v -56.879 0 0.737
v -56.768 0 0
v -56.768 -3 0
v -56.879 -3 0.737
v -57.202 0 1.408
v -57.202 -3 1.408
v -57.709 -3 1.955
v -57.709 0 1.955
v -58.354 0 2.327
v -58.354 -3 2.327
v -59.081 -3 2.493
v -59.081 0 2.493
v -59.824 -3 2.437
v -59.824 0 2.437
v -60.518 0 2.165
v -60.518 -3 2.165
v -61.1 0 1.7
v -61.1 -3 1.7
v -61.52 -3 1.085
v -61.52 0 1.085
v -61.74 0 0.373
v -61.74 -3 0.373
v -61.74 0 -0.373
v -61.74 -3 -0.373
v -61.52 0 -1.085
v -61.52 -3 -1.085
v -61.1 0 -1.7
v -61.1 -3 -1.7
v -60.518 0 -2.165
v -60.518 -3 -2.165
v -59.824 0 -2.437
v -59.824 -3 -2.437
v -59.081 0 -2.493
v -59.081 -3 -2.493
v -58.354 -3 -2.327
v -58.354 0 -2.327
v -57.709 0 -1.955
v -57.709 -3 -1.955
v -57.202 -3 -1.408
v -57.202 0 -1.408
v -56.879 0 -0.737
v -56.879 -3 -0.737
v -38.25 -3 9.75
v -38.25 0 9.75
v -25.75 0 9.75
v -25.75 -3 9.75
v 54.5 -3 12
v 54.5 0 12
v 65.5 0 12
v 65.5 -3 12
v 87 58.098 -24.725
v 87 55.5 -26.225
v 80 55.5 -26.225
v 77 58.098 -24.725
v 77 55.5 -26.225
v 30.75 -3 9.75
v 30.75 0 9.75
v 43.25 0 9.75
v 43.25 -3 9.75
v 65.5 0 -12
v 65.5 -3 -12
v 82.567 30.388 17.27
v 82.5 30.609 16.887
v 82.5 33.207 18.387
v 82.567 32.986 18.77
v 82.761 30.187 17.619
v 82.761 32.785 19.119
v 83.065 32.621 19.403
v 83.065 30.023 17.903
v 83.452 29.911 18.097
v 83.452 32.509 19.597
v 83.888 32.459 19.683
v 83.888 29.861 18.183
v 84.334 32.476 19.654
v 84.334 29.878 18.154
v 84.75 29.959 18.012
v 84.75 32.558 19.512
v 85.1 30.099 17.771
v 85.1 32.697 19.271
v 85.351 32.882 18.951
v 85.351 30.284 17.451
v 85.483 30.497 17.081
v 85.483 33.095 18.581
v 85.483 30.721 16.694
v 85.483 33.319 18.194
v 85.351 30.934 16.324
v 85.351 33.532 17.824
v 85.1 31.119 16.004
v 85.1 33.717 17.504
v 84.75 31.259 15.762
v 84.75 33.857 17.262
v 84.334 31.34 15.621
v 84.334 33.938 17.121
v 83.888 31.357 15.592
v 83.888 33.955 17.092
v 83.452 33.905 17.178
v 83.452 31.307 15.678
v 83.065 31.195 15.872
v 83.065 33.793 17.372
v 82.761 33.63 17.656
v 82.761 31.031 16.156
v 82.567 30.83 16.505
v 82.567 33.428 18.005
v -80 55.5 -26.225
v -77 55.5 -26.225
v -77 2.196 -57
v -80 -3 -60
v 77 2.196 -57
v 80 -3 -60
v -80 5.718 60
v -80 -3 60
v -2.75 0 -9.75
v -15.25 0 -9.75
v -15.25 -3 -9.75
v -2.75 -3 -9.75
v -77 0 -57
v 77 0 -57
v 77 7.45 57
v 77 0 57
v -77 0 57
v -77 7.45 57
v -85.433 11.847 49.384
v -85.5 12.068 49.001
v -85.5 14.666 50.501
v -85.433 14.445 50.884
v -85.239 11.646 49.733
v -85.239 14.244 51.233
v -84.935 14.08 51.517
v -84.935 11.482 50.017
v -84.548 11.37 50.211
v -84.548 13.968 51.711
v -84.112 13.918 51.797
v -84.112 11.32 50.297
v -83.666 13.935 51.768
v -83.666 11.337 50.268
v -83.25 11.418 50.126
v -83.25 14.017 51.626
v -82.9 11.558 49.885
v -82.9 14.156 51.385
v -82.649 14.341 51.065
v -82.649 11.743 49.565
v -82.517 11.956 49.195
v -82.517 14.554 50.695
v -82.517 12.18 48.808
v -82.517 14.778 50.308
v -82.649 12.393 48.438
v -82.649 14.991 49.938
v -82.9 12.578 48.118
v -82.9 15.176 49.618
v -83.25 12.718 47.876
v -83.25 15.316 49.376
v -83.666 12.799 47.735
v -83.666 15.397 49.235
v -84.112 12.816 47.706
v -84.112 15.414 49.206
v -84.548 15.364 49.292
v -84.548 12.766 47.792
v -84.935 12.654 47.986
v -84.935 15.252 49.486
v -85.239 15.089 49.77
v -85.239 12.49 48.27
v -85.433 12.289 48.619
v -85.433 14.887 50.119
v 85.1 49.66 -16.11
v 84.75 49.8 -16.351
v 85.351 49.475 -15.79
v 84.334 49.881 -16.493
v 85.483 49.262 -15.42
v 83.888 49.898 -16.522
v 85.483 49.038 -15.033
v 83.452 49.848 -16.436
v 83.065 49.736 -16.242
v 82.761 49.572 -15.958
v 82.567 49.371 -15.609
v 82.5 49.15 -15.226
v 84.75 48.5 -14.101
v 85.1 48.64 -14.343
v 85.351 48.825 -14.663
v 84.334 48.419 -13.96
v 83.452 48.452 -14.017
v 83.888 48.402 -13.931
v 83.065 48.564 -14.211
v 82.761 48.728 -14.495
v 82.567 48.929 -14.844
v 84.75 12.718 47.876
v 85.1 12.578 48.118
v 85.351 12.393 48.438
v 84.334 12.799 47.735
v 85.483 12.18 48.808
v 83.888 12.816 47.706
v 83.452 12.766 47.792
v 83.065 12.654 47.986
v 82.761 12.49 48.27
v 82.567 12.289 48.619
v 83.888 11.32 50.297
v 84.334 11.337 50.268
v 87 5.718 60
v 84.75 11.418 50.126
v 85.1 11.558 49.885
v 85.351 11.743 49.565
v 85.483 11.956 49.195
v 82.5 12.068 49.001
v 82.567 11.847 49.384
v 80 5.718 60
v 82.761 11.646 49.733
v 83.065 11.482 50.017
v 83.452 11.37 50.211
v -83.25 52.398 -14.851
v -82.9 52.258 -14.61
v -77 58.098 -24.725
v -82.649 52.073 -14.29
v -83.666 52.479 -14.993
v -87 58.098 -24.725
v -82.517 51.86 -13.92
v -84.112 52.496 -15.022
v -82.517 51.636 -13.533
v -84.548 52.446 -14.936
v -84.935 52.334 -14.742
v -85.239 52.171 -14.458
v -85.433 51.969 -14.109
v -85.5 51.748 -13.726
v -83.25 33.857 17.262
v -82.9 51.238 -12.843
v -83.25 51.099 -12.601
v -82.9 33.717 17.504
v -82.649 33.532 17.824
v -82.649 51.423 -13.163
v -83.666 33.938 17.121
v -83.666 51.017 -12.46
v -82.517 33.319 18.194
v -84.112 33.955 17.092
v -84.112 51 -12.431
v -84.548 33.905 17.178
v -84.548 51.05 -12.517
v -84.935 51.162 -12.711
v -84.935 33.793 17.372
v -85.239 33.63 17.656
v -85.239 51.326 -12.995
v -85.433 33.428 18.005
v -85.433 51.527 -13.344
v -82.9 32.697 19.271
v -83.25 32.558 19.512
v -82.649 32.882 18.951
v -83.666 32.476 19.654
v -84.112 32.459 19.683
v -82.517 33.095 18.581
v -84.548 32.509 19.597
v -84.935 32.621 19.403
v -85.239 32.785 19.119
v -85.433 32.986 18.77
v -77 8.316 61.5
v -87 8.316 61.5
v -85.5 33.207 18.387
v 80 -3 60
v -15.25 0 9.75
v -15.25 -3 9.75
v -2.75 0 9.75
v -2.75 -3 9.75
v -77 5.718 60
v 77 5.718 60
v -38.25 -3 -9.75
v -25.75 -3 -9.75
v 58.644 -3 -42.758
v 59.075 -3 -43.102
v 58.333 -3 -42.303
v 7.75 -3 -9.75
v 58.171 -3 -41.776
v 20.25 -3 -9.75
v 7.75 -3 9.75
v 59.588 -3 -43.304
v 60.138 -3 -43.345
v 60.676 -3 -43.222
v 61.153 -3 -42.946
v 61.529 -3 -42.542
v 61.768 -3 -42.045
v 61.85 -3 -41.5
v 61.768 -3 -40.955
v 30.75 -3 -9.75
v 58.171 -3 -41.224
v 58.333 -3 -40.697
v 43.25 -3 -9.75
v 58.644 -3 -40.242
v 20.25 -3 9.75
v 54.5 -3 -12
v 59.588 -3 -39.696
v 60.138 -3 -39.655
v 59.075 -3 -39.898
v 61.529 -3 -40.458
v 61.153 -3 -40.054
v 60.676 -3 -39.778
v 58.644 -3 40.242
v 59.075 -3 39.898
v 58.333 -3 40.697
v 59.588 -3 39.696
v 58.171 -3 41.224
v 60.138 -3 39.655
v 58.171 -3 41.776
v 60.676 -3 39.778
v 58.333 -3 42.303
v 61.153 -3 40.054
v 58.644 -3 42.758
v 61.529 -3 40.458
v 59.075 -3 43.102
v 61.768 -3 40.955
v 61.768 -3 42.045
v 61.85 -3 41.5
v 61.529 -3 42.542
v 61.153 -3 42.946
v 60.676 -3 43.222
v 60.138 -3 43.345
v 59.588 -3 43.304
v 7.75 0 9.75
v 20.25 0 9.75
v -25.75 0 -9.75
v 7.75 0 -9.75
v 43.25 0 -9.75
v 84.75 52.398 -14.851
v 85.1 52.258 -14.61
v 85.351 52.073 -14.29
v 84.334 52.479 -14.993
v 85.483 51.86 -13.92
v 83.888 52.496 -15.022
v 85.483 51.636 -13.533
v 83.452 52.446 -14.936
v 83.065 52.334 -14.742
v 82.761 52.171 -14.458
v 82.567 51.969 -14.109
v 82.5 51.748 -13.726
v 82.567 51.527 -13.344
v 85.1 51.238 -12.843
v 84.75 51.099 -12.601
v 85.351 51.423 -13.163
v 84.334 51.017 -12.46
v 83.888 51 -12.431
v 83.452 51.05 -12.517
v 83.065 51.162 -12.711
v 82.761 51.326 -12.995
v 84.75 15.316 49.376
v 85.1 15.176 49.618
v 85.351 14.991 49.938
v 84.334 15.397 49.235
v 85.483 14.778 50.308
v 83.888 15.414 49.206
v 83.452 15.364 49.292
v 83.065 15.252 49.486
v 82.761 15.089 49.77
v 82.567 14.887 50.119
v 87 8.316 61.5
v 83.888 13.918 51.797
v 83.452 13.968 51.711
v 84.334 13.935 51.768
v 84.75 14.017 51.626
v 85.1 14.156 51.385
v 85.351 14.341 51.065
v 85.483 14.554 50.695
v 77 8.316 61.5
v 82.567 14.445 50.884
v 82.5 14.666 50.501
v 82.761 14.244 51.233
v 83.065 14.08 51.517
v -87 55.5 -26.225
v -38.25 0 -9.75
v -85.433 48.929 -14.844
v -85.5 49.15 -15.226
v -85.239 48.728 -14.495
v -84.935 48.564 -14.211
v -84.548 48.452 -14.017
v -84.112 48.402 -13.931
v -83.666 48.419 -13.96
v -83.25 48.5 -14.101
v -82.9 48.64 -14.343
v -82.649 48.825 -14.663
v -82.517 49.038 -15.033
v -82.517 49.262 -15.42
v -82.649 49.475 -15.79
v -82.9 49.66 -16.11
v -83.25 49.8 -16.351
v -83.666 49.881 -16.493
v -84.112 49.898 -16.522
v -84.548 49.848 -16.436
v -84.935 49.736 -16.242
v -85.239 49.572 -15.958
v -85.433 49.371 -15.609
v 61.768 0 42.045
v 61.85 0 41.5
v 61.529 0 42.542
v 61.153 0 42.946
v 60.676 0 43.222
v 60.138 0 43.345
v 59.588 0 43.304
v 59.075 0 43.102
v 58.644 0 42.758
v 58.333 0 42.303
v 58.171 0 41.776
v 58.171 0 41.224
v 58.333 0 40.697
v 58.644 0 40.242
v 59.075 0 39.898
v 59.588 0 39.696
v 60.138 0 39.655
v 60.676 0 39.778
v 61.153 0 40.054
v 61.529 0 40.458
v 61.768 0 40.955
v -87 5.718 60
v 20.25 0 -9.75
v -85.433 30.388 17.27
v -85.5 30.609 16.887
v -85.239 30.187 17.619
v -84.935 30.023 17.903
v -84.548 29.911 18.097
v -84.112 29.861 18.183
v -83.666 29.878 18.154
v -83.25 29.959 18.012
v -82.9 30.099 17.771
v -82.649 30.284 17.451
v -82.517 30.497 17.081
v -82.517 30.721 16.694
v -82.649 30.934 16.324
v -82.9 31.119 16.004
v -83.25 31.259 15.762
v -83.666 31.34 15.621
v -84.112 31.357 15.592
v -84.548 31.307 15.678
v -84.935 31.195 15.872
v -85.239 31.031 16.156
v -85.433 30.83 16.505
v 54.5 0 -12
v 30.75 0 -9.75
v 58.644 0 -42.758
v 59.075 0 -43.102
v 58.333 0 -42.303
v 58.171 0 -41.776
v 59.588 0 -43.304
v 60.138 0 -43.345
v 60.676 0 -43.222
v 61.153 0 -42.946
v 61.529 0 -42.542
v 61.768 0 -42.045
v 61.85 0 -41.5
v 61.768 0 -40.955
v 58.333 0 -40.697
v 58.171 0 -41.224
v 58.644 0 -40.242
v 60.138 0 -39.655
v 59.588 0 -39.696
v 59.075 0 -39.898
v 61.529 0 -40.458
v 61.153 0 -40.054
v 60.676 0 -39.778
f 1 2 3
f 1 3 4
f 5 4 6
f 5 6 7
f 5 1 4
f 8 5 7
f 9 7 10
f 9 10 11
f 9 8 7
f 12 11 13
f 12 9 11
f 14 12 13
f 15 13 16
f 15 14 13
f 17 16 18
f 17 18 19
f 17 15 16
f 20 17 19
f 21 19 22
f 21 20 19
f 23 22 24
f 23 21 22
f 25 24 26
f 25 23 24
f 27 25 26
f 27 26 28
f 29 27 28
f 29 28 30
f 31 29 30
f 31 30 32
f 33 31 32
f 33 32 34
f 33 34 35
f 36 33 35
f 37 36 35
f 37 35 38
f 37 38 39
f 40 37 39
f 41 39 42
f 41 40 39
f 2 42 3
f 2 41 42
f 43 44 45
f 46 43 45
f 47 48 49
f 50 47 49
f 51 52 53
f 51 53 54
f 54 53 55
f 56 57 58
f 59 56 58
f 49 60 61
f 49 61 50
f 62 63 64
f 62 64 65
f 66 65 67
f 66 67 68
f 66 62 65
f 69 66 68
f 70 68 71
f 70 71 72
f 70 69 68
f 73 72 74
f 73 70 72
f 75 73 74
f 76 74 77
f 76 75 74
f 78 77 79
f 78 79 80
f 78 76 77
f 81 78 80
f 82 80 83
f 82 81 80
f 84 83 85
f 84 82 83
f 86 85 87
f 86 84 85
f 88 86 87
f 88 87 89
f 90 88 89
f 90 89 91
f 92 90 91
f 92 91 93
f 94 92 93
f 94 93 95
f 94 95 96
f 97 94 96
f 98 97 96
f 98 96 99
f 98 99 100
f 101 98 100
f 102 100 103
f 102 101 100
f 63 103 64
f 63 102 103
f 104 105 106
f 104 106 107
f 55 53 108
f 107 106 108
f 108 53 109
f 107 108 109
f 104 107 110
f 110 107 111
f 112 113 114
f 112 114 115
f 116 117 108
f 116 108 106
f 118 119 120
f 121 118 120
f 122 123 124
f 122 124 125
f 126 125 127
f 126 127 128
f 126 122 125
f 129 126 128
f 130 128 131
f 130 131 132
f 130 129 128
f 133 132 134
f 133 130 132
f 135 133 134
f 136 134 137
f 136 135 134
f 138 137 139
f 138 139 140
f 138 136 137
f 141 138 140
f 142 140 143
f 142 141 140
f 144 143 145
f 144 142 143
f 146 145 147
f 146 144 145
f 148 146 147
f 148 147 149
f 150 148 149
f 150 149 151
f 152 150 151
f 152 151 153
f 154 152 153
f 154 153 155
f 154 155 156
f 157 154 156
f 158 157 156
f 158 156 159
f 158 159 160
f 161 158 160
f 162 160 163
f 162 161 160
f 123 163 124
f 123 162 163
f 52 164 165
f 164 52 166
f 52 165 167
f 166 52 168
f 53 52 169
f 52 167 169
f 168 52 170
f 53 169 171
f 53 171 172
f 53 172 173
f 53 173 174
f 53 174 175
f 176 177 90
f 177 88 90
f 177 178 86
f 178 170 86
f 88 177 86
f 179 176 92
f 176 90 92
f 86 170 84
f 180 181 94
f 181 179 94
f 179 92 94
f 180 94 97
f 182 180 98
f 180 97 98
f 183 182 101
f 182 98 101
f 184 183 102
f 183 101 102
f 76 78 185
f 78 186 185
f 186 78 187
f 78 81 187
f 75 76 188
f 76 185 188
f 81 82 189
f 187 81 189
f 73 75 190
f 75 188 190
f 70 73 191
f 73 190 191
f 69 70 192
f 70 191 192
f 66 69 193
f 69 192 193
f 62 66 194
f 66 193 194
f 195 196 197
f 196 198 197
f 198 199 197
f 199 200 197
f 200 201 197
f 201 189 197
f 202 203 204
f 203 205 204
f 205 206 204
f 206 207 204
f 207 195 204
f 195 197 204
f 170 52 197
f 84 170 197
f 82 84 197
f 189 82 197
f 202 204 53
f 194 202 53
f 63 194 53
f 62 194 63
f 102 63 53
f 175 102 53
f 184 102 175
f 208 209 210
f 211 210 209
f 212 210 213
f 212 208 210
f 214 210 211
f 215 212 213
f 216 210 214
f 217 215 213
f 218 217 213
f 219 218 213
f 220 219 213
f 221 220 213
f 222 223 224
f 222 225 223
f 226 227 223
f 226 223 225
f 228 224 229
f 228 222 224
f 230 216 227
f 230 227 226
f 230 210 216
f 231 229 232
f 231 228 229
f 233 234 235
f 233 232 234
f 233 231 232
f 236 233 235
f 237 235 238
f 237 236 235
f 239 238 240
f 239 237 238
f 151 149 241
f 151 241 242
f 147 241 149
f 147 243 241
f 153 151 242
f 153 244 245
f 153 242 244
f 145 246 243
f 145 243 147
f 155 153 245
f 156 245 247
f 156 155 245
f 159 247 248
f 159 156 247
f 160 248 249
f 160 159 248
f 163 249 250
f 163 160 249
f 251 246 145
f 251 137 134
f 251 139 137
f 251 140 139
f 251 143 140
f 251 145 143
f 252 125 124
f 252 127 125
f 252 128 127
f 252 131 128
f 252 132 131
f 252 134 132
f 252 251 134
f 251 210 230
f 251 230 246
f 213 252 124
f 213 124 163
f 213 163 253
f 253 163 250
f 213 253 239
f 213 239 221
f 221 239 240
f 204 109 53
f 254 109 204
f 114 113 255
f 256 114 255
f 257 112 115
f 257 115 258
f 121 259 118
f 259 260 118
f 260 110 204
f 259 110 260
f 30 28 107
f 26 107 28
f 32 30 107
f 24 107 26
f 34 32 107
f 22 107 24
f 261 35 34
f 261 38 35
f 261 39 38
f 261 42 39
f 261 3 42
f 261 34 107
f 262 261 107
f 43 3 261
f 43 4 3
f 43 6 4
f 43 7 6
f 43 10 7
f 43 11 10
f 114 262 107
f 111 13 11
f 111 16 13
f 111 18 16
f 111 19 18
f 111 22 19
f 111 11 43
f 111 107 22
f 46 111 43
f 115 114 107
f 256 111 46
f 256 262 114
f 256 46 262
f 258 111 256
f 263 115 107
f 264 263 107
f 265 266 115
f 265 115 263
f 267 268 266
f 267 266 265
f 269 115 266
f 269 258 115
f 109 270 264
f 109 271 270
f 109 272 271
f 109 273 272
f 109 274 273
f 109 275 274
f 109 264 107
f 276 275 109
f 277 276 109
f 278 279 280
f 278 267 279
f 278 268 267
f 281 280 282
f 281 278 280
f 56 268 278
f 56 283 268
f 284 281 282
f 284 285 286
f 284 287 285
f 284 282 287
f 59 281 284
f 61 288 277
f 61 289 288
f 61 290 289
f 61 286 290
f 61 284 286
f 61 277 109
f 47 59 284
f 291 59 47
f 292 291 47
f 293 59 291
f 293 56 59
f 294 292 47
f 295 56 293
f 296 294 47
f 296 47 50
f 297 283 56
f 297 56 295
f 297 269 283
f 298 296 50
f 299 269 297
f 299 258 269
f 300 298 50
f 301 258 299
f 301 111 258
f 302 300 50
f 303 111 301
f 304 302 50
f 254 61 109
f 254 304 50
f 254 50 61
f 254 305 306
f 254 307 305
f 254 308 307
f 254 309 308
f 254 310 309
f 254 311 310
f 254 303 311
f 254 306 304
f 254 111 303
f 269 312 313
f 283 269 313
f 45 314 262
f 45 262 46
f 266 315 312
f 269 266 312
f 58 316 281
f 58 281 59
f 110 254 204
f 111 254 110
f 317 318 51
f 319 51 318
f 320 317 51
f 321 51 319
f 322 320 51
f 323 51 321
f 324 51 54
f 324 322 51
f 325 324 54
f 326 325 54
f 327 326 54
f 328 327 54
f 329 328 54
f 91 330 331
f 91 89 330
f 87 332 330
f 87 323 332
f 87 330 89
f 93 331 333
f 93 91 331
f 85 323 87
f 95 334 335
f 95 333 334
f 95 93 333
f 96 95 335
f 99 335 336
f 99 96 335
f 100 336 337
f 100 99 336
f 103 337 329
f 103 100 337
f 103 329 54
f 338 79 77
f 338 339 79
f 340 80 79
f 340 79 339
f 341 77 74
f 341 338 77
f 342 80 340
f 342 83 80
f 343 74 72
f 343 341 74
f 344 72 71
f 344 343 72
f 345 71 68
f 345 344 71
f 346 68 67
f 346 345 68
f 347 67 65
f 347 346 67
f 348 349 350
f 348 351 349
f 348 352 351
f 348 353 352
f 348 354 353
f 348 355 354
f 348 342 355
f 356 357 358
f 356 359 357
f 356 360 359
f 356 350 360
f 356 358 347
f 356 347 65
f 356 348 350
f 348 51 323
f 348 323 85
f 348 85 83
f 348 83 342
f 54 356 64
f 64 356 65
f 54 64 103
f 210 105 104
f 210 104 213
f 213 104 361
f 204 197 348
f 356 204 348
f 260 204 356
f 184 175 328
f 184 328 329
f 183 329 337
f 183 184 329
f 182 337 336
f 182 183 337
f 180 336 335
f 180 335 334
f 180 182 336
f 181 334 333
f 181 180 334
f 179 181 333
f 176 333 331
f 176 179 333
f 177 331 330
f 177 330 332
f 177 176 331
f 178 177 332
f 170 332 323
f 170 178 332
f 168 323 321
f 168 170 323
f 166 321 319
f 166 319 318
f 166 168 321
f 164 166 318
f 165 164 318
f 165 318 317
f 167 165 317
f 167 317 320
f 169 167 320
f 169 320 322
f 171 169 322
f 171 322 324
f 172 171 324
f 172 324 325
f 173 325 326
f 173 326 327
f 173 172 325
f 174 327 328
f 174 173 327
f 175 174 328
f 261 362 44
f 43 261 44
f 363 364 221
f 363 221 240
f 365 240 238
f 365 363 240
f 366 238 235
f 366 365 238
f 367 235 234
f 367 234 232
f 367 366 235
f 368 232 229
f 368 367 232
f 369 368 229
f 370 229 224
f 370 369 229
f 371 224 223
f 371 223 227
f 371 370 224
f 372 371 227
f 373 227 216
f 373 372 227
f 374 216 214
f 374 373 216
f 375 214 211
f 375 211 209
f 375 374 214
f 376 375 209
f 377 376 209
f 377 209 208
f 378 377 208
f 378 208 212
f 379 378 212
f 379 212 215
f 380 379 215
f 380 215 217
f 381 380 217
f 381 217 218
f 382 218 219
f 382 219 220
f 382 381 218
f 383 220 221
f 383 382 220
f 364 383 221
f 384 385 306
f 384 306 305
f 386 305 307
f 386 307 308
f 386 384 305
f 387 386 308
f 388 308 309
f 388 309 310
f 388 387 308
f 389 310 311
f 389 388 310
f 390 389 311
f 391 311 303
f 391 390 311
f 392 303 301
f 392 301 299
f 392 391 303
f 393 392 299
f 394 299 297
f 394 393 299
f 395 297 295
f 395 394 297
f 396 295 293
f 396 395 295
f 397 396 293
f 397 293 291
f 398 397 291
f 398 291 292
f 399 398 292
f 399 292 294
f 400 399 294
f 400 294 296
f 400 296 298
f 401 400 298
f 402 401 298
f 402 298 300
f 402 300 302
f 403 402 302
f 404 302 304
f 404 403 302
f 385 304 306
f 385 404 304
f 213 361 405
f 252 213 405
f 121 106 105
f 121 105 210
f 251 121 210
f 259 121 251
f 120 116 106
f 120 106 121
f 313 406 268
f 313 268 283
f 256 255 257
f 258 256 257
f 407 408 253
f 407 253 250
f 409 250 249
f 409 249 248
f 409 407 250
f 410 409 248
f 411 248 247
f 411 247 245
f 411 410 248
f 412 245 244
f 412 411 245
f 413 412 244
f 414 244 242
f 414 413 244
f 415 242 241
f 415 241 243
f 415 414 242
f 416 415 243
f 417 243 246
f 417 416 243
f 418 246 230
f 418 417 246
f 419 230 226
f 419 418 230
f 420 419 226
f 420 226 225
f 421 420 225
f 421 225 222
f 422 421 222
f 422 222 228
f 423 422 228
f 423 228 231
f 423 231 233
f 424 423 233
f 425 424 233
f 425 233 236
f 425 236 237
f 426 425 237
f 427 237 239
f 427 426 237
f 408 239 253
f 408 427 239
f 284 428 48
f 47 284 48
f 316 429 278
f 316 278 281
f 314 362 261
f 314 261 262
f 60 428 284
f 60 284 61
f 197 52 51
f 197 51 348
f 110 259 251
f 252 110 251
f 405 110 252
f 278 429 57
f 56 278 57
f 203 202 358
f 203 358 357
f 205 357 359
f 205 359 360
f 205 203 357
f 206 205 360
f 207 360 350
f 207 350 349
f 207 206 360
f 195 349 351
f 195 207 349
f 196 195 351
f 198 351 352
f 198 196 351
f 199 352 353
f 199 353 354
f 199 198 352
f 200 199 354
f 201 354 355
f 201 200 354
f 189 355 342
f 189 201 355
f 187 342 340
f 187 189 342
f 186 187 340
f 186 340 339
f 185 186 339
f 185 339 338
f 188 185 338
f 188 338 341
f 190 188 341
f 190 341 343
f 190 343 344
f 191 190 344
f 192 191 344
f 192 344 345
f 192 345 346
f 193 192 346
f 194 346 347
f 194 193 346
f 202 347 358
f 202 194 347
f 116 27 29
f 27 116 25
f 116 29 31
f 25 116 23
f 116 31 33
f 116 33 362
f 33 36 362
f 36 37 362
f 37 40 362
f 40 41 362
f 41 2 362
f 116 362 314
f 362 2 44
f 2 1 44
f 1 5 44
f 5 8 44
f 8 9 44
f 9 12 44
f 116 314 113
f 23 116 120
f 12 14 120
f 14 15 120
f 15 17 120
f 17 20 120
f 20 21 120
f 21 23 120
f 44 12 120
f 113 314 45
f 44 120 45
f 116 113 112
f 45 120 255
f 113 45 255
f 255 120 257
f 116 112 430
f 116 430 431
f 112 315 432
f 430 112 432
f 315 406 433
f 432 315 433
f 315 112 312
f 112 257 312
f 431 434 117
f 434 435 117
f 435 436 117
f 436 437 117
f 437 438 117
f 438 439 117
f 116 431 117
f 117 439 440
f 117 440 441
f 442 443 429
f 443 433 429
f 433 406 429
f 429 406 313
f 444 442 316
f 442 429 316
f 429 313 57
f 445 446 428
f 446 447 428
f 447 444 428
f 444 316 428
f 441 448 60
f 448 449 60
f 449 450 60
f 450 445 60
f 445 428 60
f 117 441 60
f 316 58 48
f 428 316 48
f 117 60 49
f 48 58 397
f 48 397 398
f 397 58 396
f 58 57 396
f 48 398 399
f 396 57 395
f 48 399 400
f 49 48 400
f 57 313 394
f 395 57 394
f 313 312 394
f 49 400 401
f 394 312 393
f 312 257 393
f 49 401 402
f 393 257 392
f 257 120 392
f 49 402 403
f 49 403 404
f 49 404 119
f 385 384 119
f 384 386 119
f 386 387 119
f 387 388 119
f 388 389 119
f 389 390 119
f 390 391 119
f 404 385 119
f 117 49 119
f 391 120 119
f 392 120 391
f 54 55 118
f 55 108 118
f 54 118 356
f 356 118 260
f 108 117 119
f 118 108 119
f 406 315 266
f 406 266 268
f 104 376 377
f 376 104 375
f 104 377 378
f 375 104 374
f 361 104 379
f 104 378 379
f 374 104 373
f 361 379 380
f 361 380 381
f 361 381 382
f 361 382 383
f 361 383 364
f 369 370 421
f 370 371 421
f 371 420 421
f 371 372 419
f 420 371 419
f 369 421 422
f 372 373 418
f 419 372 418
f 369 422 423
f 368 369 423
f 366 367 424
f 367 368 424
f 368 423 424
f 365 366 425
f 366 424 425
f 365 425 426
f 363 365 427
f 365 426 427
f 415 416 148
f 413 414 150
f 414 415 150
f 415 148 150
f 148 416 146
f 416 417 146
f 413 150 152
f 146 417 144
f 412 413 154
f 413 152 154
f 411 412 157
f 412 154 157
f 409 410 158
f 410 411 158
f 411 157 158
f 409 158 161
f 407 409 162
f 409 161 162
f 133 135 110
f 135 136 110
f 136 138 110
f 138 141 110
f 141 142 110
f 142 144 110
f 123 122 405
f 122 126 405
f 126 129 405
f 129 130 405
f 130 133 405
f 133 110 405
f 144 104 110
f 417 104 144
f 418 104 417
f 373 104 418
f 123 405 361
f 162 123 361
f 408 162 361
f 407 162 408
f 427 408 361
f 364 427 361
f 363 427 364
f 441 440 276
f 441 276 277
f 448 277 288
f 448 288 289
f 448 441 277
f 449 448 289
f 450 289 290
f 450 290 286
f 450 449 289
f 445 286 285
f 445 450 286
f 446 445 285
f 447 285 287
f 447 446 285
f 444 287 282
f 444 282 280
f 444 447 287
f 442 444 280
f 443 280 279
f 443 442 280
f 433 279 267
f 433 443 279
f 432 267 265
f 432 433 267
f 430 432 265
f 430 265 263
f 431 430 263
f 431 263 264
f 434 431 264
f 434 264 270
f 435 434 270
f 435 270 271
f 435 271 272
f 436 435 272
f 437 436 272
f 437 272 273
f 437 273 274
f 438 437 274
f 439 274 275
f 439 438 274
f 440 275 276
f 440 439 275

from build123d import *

# Parameters (mm, degrees)
F0_W     = 160
F0_H     = 120
F0_R     = 1.85
F0_R_2   = 2.5
F0_W_2   = 12.5
F0_H_2   = 19.5
F0_W_3   = 11
F0_H_3   = 24
F1_DEPTH = 3
F2_W     = 160
F2_H     = 120
F2_W_2   = 154
F2_H_2   = 114
F3_DEPTH = 75
F5_DEPTH = 160.001
F6_W     = 10
F6_H     = 99.564
F6_R     = 1.5
F7_DEPTH = 3


with BuildPart() as f1:
    # F0 (on Front) → F1 (new body)
    with BuildSketch(Plane.XZ):
        Rectangle(F0_W, F0_H)
        with Locations((60, -41.5)):
            Circle(F0_R, mode=Mode.SUBTRACT)
        with Locations((-59.2675954103, 0)):
            Circle(F0_R_2, mode=Mode.SUBTRACT)
        with Locations((-32, 0)):
            Rectangle(F0_W_2, F0_H_2, mode=Mode.SUBTRACT)
        with Locations((-9, 0)):
            Rectangle(F0_W_2, F0_H_2, mode=Mode.SUBTRACT)
        with Locations((14, 0)):
            Rectangle(F0_W_2, F0_H_2, mode=Mode.SUBTRACT)
        with Locations((37, 0)):
            Rectangle(F0_W_2, F0_H_2, mode=Mode.SUBTRACT)
        with Locations((60, 0)):
            Rectangle(F0_W_3, F0_H_3, mode=Mode.SUBTRACT)
        with Locations((60, 41.5)):
            Circle(F0_R, mode=Mode.SUBTRACT)
    extrude(amount=F1_DEPTH)

    # F2 (on face) → F3 (join)
    with BuildSketch(Plane(origin=(0, 0, 0), x_dir=(-1, 0, 0), z_dir=(0, 1, 0))):
        Rectangle(F2_W, F2_H)
        Rectangle(F2_W_2, F2_H_2, mode=Mode.SUBTRACT)
    extrude(amount=F3_DEPTH)

    # F4 (on face) → F5 (cut, through all)
    with BuildSketch(Plane.YZ.offset(80)):
        Polygon((75, 60), (5.7179676972, 60), (55.5, -26.2250092524), (-3, -60), (75, -60), align=None)
    extrude(amount=-F5_DEPTH, mode=Mode.SUBTRACT)

    # F6 (on face) → F7 (join)
    with BuildSketch(Plane(origin=(0, 30.2692378865, 17.4759526419), x_dir=(-1, 0, 0), z_dir=(0, 0.8660254038, 0.5))):
        with Locations((-82, -0.6795242271)):
            Rectangle(F6_W, F6_H)
        with Locations((-84, -37.7615242271)):
            Circle(F6_R, mode=Mode.SUBTRACT)
        with Locations((-84, -0.6795242271)):
            Circle(F6_R, mode=Mode.SUBTRACT)
        with Locations((-84, 36.4024757729)):
            Circle(F6_R, mode=Mode.SUBTRACT)
        with Locations((82, -0.6795242271)):
            Rectangle(F6_W, F6_H)
        with Locations((84, -37.7615242271)):
            Circle(F6_R, mode=Mode.SUBTRACT)
        with Locations((84, -0.6795242271)):
            Circle(F6_R, mode=Mode.SUBTRACT)
        with Locations((84, 36.4024757729)):
            Circle(F6_R, mode=Mode.SUBTRACT)
    extrude(amount=F7_DEPTH)


solid = f1.part
